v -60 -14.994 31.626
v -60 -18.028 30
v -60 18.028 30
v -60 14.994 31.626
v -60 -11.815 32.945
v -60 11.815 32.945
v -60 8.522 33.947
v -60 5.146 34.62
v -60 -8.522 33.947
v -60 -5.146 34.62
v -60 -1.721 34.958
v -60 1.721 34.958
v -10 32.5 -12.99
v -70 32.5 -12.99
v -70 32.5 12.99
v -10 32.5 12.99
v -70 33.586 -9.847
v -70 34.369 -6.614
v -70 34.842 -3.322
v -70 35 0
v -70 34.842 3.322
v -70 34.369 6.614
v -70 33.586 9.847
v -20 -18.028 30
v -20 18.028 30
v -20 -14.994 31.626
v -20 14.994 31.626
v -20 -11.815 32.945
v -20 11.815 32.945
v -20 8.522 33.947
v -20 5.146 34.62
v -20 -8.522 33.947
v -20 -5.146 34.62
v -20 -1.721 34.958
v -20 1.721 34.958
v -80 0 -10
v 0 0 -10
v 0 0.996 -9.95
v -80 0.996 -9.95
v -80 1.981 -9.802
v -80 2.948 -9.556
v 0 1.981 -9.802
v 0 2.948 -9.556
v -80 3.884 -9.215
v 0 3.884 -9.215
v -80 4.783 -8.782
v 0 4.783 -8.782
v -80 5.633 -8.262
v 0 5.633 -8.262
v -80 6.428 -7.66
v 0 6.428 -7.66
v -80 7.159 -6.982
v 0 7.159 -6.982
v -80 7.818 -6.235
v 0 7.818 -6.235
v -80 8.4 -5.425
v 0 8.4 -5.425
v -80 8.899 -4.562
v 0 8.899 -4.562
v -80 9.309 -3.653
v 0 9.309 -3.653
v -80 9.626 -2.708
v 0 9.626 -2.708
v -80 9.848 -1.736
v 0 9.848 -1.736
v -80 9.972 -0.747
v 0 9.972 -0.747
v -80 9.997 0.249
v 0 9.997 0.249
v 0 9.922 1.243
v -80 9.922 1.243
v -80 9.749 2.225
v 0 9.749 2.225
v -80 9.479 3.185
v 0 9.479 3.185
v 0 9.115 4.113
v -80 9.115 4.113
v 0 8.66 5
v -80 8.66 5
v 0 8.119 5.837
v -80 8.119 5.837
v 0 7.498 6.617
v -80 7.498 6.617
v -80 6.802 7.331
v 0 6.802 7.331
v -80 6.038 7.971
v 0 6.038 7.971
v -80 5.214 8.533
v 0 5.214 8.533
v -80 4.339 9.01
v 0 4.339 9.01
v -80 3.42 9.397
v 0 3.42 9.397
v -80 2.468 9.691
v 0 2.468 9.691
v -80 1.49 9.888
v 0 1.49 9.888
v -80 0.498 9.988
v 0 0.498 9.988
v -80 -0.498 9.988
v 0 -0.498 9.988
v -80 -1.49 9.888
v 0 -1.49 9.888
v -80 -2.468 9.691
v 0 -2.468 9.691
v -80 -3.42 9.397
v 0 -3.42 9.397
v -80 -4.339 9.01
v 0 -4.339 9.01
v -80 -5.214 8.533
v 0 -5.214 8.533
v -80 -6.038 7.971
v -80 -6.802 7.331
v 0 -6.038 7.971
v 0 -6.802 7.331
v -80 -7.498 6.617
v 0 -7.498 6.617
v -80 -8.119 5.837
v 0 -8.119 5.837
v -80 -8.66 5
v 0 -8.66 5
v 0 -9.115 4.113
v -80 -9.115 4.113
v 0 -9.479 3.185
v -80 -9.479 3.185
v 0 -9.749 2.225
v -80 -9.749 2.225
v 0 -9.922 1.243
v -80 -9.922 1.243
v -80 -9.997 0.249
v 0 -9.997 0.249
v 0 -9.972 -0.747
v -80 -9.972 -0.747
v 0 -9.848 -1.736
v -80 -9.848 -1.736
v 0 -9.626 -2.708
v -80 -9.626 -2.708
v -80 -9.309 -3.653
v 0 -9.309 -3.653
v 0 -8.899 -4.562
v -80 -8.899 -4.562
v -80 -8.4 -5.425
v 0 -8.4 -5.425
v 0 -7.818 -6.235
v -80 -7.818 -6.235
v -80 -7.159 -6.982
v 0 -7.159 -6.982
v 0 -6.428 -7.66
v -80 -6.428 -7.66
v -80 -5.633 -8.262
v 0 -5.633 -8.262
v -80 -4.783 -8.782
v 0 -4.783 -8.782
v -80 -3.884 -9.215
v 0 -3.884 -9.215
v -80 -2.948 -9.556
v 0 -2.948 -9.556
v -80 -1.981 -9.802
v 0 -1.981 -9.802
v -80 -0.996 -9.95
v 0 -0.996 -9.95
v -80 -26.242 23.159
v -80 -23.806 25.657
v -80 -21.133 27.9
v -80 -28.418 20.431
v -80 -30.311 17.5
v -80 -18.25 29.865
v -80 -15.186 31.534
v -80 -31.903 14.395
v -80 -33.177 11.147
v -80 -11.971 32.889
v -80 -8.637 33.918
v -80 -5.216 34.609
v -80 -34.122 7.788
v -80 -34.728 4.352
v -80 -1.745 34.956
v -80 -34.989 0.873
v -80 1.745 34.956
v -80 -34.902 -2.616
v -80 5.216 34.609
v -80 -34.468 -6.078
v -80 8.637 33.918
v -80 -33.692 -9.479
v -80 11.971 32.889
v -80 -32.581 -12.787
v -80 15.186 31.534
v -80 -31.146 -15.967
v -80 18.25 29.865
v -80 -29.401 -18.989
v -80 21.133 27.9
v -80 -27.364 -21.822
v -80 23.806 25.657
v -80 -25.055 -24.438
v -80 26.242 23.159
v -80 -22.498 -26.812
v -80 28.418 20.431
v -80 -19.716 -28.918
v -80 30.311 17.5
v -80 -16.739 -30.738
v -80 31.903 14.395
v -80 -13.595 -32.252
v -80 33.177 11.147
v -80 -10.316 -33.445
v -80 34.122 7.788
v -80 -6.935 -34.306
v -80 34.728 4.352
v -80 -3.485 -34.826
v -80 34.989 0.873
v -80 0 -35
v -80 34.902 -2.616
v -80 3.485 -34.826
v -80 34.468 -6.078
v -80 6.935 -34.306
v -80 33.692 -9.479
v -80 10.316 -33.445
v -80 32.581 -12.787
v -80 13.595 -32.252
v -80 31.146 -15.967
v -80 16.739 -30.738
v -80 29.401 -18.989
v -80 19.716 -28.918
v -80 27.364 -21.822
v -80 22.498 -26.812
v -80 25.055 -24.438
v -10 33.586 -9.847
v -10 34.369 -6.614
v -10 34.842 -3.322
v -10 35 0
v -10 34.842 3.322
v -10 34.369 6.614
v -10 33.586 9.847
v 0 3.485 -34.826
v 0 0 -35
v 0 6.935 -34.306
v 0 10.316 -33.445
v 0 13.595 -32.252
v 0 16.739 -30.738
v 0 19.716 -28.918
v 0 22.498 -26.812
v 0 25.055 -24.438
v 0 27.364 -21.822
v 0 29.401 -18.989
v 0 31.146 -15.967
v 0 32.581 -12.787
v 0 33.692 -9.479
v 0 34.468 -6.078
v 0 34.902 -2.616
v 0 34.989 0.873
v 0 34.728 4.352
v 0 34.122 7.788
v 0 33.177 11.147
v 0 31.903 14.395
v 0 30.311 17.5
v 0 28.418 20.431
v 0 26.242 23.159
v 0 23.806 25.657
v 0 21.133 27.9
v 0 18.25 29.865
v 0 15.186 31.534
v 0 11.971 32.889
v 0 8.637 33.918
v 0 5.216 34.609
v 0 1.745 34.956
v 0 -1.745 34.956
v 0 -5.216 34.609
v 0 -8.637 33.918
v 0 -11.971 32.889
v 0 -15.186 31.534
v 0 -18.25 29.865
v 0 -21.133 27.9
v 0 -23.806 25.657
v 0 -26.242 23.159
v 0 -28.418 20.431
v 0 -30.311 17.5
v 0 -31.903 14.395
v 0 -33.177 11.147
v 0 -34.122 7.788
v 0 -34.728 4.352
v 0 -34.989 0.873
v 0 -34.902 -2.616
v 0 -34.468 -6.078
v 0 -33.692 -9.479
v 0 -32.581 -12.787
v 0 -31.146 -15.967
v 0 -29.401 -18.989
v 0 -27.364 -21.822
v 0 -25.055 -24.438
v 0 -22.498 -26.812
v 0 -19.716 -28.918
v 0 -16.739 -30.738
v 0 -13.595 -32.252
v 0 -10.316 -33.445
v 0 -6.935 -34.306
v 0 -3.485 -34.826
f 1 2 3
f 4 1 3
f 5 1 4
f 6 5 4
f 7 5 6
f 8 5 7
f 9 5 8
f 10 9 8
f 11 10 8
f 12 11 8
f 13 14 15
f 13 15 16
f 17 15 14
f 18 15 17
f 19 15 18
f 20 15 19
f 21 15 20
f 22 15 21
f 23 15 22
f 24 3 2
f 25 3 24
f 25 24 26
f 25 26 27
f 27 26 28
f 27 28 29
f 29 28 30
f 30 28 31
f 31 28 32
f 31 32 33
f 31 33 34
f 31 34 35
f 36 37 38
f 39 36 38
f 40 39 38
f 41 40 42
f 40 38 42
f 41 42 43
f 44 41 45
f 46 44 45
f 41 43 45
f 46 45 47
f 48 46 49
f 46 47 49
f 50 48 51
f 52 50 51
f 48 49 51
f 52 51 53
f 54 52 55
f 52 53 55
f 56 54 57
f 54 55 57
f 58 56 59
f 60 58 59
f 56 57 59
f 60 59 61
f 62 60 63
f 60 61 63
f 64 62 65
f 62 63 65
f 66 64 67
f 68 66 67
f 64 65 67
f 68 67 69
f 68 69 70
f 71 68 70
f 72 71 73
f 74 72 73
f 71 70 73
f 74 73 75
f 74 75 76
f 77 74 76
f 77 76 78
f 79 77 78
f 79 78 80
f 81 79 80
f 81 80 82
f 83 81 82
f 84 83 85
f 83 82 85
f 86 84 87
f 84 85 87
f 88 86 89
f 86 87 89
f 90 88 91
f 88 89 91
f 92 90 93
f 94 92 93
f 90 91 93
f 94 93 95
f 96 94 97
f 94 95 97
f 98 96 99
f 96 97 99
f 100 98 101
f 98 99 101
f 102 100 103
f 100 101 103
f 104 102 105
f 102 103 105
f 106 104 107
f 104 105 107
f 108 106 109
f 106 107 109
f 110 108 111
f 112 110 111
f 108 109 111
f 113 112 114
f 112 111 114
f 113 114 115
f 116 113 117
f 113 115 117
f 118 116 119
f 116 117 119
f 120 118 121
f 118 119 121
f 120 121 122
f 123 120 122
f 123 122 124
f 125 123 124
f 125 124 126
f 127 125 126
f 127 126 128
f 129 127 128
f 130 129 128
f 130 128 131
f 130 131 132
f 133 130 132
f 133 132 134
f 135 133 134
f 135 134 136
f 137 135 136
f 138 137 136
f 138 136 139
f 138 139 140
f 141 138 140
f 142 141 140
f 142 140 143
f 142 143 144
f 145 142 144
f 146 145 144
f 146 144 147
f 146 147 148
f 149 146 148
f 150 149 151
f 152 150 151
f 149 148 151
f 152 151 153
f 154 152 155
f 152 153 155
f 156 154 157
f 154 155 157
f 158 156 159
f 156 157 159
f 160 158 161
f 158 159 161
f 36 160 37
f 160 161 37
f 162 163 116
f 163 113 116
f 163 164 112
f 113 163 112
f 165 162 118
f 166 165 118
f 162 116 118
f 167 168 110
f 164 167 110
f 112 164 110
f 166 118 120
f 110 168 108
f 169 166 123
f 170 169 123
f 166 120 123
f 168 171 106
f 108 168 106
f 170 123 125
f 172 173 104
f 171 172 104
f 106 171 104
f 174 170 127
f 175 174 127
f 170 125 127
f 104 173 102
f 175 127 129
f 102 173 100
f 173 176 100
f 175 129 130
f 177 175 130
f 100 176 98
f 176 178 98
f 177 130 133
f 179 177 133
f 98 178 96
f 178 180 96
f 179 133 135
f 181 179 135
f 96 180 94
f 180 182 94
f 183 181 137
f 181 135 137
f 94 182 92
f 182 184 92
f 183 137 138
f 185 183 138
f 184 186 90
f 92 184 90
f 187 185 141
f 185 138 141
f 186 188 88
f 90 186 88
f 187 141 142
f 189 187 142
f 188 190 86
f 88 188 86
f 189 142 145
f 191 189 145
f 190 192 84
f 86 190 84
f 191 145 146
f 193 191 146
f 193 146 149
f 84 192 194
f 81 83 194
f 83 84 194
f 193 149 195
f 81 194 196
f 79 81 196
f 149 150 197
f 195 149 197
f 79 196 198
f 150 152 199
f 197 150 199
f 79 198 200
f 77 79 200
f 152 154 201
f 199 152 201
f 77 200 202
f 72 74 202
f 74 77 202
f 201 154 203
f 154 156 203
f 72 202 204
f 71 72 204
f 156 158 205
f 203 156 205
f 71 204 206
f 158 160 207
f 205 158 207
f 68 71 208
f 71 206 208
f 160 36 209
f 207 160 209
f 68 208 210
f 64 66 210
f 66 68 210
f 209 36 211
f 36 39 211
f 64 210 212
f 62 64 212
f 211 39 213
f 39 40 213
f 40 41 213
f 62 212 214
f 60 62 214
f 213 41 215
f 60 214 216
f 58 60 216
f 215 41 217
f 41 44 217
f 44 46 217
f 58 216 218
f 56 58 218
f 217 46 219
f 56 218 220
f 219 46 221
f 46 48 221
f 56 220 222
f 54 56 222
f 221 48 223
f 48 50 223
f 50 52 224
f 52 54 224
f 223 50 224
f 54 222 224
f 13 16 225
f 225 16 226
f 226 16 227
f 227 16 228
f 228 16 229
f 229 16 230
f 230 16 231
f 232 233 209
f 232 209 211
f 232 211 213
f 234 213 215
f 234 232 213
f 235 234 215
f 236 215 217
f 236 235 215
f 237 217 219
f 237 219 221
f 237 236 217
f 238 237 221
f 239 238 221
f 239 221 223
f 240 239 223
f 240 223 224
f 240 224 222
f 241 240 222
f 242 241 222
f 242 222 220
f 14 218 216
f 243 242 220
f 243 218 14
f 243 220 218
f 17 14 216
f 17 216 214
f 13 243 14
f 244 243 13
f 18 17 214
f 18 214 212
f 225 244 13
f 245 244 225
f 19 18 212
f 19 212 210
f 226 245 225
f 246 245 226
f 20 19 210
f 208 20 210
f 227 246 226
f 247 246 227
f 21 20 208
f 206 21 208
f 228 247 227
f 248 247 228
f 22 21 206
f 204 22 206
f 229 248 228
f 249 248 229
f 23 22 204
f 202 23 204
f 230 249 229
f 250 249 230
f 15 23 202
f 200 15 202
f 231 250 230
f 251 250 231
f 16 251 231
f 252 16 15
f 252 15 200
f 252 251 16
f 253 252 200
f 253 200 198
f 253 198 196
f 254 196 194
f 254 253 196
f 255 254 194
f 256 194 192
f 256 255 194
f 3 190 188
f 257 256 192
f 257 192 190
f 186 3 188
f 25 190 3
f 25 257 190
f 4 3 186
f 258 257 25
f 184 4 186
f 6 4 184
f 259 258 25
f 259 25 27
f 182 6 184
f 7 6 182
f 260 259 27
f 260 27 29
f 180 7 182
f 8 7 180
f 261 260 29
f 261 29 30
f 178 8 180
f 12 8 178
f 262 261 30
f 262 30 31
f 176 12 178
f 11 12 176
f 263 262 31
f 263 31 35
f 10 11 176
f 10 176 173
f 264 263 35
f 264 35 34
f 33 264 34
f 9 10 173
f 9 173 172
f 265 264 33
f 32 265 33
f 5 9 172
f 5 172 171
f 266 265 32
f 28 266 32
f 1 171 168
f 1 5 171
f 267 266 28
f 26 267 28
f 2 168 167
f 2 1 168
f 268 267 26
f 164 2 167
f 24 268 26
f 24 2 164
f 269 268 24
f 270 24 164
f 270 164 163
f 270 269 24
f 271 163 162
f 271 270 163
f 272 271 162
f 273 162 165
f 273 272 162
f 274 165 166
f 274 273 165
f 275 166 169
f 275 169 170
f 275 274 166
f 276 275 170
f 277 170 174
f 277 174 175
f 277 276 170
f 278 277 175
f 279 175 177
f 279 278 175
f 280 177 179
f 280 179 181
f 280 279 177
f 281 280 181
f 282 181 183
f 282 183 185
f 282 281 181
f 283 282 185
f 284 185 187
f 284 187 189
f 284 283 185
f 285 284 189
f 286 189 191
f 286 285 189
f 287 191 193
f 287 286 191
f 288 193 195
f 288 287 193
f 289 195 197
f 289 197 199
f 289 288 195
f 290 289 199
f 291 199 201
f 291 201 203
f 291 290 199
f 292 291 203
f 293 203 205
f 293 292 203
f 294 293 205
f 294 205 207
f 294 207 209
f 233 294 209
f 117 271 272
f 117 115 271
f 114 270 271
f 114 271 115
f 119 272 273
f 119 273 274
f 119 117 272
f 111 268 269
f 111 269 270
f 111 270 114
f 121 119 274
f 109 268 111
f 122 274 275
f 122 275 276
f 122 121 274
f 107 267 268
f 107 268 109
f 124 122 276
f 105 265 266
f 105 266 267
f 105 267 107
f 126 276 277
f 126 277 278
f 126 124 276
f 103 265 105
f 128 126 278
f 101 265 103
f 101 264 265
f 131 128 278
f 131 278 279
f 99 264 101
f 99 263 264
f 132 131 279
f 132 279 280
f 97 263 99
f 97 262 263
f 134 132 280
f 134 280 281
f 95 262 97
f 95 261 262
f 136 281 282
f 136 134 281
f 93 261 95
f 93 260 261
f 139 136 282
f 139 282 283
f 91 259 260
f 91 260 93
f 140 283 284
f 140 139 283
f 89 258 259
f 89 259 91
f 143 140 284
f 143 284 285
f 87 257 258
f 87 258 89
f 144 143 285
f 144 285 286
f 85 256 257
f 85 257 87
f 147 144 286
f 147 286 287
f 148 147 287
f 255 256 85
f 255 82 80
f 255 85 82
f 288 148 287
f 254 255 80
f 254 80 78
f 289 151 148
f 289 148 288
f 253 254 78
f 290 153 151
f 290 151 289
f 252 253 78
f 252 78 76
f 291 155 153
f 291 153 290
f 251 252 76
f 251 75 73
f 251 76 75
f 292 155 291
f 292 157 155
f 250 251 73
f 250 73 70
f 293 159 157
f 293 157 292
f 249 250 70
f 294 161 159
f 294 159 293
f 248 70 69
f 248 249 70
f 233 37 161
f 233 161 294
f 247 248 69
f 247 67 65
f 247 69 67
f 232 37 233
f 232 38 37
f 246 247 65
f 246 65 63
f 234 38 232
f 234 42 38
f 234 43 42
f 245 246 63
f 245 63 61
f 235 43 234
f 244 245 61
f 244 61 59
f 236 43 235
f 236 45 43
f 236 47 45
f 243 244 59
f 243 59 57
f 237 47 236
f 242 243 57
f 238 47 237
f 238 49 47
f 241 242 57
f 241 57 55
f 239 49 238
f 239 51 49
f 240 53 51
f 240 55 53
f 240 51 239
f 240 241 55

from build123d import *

# Parameters (mm, degrees)
SKETCH5_R           = 35
SKETCH5_R_2         = 10
BOSS_EXTRUDE2_DEPTH = 80
SKETCH6_W           = 60
SKETCH6_H           = 25.98
CUT_EXTRUDE3_DEPTH  = 10
SKETCH7_W           = 40
SKETCH7_H           = 36.06
CUT_EXTRUDE4_DEPTH  = 10


with BuildPart() as part:
    # Sketch5 → Boss-Extrude2 (new body)
    with BuildSketch(Plane(origin=(0, 0, 0), x_dir=(0, 0, -1), z_dir=(1, 0, 0))):
        Circle(SKETCH5_R)
        Circle(SKETCH5_R_2, mode=Mode.SUBTRACT)
    extrude(amount=-BOSS_EXTRUDE2_DEPTH)

    # Sketch6 → Cut-Extrude3 (cut)
    with BuildSketch(Plane(origin=(0, 32.5, 0), x_dir=(1, 0, 0), z_dir=(0, 1, 0))):
        with Locations((-40, 0)):
            Rectangle(SKETCH6_W, SKETCH6_H)
    extrude(amount=CUT_EXTRUDE3_DEPTH, mode=Mode.SUBTRACT)

    # Sketch7 → Cut-Extrude4 (cut)
    with BuildSketch(Plane.XY.offset(30)):
        with Locations((-40, 0)):
            Rectangle(SKETCH7_W, SKETCH7_H)
    extrude(amount=CUT_EXTRUDE4_DEPTH, mode=Mode.SUBTRACT)


solid = part.part
